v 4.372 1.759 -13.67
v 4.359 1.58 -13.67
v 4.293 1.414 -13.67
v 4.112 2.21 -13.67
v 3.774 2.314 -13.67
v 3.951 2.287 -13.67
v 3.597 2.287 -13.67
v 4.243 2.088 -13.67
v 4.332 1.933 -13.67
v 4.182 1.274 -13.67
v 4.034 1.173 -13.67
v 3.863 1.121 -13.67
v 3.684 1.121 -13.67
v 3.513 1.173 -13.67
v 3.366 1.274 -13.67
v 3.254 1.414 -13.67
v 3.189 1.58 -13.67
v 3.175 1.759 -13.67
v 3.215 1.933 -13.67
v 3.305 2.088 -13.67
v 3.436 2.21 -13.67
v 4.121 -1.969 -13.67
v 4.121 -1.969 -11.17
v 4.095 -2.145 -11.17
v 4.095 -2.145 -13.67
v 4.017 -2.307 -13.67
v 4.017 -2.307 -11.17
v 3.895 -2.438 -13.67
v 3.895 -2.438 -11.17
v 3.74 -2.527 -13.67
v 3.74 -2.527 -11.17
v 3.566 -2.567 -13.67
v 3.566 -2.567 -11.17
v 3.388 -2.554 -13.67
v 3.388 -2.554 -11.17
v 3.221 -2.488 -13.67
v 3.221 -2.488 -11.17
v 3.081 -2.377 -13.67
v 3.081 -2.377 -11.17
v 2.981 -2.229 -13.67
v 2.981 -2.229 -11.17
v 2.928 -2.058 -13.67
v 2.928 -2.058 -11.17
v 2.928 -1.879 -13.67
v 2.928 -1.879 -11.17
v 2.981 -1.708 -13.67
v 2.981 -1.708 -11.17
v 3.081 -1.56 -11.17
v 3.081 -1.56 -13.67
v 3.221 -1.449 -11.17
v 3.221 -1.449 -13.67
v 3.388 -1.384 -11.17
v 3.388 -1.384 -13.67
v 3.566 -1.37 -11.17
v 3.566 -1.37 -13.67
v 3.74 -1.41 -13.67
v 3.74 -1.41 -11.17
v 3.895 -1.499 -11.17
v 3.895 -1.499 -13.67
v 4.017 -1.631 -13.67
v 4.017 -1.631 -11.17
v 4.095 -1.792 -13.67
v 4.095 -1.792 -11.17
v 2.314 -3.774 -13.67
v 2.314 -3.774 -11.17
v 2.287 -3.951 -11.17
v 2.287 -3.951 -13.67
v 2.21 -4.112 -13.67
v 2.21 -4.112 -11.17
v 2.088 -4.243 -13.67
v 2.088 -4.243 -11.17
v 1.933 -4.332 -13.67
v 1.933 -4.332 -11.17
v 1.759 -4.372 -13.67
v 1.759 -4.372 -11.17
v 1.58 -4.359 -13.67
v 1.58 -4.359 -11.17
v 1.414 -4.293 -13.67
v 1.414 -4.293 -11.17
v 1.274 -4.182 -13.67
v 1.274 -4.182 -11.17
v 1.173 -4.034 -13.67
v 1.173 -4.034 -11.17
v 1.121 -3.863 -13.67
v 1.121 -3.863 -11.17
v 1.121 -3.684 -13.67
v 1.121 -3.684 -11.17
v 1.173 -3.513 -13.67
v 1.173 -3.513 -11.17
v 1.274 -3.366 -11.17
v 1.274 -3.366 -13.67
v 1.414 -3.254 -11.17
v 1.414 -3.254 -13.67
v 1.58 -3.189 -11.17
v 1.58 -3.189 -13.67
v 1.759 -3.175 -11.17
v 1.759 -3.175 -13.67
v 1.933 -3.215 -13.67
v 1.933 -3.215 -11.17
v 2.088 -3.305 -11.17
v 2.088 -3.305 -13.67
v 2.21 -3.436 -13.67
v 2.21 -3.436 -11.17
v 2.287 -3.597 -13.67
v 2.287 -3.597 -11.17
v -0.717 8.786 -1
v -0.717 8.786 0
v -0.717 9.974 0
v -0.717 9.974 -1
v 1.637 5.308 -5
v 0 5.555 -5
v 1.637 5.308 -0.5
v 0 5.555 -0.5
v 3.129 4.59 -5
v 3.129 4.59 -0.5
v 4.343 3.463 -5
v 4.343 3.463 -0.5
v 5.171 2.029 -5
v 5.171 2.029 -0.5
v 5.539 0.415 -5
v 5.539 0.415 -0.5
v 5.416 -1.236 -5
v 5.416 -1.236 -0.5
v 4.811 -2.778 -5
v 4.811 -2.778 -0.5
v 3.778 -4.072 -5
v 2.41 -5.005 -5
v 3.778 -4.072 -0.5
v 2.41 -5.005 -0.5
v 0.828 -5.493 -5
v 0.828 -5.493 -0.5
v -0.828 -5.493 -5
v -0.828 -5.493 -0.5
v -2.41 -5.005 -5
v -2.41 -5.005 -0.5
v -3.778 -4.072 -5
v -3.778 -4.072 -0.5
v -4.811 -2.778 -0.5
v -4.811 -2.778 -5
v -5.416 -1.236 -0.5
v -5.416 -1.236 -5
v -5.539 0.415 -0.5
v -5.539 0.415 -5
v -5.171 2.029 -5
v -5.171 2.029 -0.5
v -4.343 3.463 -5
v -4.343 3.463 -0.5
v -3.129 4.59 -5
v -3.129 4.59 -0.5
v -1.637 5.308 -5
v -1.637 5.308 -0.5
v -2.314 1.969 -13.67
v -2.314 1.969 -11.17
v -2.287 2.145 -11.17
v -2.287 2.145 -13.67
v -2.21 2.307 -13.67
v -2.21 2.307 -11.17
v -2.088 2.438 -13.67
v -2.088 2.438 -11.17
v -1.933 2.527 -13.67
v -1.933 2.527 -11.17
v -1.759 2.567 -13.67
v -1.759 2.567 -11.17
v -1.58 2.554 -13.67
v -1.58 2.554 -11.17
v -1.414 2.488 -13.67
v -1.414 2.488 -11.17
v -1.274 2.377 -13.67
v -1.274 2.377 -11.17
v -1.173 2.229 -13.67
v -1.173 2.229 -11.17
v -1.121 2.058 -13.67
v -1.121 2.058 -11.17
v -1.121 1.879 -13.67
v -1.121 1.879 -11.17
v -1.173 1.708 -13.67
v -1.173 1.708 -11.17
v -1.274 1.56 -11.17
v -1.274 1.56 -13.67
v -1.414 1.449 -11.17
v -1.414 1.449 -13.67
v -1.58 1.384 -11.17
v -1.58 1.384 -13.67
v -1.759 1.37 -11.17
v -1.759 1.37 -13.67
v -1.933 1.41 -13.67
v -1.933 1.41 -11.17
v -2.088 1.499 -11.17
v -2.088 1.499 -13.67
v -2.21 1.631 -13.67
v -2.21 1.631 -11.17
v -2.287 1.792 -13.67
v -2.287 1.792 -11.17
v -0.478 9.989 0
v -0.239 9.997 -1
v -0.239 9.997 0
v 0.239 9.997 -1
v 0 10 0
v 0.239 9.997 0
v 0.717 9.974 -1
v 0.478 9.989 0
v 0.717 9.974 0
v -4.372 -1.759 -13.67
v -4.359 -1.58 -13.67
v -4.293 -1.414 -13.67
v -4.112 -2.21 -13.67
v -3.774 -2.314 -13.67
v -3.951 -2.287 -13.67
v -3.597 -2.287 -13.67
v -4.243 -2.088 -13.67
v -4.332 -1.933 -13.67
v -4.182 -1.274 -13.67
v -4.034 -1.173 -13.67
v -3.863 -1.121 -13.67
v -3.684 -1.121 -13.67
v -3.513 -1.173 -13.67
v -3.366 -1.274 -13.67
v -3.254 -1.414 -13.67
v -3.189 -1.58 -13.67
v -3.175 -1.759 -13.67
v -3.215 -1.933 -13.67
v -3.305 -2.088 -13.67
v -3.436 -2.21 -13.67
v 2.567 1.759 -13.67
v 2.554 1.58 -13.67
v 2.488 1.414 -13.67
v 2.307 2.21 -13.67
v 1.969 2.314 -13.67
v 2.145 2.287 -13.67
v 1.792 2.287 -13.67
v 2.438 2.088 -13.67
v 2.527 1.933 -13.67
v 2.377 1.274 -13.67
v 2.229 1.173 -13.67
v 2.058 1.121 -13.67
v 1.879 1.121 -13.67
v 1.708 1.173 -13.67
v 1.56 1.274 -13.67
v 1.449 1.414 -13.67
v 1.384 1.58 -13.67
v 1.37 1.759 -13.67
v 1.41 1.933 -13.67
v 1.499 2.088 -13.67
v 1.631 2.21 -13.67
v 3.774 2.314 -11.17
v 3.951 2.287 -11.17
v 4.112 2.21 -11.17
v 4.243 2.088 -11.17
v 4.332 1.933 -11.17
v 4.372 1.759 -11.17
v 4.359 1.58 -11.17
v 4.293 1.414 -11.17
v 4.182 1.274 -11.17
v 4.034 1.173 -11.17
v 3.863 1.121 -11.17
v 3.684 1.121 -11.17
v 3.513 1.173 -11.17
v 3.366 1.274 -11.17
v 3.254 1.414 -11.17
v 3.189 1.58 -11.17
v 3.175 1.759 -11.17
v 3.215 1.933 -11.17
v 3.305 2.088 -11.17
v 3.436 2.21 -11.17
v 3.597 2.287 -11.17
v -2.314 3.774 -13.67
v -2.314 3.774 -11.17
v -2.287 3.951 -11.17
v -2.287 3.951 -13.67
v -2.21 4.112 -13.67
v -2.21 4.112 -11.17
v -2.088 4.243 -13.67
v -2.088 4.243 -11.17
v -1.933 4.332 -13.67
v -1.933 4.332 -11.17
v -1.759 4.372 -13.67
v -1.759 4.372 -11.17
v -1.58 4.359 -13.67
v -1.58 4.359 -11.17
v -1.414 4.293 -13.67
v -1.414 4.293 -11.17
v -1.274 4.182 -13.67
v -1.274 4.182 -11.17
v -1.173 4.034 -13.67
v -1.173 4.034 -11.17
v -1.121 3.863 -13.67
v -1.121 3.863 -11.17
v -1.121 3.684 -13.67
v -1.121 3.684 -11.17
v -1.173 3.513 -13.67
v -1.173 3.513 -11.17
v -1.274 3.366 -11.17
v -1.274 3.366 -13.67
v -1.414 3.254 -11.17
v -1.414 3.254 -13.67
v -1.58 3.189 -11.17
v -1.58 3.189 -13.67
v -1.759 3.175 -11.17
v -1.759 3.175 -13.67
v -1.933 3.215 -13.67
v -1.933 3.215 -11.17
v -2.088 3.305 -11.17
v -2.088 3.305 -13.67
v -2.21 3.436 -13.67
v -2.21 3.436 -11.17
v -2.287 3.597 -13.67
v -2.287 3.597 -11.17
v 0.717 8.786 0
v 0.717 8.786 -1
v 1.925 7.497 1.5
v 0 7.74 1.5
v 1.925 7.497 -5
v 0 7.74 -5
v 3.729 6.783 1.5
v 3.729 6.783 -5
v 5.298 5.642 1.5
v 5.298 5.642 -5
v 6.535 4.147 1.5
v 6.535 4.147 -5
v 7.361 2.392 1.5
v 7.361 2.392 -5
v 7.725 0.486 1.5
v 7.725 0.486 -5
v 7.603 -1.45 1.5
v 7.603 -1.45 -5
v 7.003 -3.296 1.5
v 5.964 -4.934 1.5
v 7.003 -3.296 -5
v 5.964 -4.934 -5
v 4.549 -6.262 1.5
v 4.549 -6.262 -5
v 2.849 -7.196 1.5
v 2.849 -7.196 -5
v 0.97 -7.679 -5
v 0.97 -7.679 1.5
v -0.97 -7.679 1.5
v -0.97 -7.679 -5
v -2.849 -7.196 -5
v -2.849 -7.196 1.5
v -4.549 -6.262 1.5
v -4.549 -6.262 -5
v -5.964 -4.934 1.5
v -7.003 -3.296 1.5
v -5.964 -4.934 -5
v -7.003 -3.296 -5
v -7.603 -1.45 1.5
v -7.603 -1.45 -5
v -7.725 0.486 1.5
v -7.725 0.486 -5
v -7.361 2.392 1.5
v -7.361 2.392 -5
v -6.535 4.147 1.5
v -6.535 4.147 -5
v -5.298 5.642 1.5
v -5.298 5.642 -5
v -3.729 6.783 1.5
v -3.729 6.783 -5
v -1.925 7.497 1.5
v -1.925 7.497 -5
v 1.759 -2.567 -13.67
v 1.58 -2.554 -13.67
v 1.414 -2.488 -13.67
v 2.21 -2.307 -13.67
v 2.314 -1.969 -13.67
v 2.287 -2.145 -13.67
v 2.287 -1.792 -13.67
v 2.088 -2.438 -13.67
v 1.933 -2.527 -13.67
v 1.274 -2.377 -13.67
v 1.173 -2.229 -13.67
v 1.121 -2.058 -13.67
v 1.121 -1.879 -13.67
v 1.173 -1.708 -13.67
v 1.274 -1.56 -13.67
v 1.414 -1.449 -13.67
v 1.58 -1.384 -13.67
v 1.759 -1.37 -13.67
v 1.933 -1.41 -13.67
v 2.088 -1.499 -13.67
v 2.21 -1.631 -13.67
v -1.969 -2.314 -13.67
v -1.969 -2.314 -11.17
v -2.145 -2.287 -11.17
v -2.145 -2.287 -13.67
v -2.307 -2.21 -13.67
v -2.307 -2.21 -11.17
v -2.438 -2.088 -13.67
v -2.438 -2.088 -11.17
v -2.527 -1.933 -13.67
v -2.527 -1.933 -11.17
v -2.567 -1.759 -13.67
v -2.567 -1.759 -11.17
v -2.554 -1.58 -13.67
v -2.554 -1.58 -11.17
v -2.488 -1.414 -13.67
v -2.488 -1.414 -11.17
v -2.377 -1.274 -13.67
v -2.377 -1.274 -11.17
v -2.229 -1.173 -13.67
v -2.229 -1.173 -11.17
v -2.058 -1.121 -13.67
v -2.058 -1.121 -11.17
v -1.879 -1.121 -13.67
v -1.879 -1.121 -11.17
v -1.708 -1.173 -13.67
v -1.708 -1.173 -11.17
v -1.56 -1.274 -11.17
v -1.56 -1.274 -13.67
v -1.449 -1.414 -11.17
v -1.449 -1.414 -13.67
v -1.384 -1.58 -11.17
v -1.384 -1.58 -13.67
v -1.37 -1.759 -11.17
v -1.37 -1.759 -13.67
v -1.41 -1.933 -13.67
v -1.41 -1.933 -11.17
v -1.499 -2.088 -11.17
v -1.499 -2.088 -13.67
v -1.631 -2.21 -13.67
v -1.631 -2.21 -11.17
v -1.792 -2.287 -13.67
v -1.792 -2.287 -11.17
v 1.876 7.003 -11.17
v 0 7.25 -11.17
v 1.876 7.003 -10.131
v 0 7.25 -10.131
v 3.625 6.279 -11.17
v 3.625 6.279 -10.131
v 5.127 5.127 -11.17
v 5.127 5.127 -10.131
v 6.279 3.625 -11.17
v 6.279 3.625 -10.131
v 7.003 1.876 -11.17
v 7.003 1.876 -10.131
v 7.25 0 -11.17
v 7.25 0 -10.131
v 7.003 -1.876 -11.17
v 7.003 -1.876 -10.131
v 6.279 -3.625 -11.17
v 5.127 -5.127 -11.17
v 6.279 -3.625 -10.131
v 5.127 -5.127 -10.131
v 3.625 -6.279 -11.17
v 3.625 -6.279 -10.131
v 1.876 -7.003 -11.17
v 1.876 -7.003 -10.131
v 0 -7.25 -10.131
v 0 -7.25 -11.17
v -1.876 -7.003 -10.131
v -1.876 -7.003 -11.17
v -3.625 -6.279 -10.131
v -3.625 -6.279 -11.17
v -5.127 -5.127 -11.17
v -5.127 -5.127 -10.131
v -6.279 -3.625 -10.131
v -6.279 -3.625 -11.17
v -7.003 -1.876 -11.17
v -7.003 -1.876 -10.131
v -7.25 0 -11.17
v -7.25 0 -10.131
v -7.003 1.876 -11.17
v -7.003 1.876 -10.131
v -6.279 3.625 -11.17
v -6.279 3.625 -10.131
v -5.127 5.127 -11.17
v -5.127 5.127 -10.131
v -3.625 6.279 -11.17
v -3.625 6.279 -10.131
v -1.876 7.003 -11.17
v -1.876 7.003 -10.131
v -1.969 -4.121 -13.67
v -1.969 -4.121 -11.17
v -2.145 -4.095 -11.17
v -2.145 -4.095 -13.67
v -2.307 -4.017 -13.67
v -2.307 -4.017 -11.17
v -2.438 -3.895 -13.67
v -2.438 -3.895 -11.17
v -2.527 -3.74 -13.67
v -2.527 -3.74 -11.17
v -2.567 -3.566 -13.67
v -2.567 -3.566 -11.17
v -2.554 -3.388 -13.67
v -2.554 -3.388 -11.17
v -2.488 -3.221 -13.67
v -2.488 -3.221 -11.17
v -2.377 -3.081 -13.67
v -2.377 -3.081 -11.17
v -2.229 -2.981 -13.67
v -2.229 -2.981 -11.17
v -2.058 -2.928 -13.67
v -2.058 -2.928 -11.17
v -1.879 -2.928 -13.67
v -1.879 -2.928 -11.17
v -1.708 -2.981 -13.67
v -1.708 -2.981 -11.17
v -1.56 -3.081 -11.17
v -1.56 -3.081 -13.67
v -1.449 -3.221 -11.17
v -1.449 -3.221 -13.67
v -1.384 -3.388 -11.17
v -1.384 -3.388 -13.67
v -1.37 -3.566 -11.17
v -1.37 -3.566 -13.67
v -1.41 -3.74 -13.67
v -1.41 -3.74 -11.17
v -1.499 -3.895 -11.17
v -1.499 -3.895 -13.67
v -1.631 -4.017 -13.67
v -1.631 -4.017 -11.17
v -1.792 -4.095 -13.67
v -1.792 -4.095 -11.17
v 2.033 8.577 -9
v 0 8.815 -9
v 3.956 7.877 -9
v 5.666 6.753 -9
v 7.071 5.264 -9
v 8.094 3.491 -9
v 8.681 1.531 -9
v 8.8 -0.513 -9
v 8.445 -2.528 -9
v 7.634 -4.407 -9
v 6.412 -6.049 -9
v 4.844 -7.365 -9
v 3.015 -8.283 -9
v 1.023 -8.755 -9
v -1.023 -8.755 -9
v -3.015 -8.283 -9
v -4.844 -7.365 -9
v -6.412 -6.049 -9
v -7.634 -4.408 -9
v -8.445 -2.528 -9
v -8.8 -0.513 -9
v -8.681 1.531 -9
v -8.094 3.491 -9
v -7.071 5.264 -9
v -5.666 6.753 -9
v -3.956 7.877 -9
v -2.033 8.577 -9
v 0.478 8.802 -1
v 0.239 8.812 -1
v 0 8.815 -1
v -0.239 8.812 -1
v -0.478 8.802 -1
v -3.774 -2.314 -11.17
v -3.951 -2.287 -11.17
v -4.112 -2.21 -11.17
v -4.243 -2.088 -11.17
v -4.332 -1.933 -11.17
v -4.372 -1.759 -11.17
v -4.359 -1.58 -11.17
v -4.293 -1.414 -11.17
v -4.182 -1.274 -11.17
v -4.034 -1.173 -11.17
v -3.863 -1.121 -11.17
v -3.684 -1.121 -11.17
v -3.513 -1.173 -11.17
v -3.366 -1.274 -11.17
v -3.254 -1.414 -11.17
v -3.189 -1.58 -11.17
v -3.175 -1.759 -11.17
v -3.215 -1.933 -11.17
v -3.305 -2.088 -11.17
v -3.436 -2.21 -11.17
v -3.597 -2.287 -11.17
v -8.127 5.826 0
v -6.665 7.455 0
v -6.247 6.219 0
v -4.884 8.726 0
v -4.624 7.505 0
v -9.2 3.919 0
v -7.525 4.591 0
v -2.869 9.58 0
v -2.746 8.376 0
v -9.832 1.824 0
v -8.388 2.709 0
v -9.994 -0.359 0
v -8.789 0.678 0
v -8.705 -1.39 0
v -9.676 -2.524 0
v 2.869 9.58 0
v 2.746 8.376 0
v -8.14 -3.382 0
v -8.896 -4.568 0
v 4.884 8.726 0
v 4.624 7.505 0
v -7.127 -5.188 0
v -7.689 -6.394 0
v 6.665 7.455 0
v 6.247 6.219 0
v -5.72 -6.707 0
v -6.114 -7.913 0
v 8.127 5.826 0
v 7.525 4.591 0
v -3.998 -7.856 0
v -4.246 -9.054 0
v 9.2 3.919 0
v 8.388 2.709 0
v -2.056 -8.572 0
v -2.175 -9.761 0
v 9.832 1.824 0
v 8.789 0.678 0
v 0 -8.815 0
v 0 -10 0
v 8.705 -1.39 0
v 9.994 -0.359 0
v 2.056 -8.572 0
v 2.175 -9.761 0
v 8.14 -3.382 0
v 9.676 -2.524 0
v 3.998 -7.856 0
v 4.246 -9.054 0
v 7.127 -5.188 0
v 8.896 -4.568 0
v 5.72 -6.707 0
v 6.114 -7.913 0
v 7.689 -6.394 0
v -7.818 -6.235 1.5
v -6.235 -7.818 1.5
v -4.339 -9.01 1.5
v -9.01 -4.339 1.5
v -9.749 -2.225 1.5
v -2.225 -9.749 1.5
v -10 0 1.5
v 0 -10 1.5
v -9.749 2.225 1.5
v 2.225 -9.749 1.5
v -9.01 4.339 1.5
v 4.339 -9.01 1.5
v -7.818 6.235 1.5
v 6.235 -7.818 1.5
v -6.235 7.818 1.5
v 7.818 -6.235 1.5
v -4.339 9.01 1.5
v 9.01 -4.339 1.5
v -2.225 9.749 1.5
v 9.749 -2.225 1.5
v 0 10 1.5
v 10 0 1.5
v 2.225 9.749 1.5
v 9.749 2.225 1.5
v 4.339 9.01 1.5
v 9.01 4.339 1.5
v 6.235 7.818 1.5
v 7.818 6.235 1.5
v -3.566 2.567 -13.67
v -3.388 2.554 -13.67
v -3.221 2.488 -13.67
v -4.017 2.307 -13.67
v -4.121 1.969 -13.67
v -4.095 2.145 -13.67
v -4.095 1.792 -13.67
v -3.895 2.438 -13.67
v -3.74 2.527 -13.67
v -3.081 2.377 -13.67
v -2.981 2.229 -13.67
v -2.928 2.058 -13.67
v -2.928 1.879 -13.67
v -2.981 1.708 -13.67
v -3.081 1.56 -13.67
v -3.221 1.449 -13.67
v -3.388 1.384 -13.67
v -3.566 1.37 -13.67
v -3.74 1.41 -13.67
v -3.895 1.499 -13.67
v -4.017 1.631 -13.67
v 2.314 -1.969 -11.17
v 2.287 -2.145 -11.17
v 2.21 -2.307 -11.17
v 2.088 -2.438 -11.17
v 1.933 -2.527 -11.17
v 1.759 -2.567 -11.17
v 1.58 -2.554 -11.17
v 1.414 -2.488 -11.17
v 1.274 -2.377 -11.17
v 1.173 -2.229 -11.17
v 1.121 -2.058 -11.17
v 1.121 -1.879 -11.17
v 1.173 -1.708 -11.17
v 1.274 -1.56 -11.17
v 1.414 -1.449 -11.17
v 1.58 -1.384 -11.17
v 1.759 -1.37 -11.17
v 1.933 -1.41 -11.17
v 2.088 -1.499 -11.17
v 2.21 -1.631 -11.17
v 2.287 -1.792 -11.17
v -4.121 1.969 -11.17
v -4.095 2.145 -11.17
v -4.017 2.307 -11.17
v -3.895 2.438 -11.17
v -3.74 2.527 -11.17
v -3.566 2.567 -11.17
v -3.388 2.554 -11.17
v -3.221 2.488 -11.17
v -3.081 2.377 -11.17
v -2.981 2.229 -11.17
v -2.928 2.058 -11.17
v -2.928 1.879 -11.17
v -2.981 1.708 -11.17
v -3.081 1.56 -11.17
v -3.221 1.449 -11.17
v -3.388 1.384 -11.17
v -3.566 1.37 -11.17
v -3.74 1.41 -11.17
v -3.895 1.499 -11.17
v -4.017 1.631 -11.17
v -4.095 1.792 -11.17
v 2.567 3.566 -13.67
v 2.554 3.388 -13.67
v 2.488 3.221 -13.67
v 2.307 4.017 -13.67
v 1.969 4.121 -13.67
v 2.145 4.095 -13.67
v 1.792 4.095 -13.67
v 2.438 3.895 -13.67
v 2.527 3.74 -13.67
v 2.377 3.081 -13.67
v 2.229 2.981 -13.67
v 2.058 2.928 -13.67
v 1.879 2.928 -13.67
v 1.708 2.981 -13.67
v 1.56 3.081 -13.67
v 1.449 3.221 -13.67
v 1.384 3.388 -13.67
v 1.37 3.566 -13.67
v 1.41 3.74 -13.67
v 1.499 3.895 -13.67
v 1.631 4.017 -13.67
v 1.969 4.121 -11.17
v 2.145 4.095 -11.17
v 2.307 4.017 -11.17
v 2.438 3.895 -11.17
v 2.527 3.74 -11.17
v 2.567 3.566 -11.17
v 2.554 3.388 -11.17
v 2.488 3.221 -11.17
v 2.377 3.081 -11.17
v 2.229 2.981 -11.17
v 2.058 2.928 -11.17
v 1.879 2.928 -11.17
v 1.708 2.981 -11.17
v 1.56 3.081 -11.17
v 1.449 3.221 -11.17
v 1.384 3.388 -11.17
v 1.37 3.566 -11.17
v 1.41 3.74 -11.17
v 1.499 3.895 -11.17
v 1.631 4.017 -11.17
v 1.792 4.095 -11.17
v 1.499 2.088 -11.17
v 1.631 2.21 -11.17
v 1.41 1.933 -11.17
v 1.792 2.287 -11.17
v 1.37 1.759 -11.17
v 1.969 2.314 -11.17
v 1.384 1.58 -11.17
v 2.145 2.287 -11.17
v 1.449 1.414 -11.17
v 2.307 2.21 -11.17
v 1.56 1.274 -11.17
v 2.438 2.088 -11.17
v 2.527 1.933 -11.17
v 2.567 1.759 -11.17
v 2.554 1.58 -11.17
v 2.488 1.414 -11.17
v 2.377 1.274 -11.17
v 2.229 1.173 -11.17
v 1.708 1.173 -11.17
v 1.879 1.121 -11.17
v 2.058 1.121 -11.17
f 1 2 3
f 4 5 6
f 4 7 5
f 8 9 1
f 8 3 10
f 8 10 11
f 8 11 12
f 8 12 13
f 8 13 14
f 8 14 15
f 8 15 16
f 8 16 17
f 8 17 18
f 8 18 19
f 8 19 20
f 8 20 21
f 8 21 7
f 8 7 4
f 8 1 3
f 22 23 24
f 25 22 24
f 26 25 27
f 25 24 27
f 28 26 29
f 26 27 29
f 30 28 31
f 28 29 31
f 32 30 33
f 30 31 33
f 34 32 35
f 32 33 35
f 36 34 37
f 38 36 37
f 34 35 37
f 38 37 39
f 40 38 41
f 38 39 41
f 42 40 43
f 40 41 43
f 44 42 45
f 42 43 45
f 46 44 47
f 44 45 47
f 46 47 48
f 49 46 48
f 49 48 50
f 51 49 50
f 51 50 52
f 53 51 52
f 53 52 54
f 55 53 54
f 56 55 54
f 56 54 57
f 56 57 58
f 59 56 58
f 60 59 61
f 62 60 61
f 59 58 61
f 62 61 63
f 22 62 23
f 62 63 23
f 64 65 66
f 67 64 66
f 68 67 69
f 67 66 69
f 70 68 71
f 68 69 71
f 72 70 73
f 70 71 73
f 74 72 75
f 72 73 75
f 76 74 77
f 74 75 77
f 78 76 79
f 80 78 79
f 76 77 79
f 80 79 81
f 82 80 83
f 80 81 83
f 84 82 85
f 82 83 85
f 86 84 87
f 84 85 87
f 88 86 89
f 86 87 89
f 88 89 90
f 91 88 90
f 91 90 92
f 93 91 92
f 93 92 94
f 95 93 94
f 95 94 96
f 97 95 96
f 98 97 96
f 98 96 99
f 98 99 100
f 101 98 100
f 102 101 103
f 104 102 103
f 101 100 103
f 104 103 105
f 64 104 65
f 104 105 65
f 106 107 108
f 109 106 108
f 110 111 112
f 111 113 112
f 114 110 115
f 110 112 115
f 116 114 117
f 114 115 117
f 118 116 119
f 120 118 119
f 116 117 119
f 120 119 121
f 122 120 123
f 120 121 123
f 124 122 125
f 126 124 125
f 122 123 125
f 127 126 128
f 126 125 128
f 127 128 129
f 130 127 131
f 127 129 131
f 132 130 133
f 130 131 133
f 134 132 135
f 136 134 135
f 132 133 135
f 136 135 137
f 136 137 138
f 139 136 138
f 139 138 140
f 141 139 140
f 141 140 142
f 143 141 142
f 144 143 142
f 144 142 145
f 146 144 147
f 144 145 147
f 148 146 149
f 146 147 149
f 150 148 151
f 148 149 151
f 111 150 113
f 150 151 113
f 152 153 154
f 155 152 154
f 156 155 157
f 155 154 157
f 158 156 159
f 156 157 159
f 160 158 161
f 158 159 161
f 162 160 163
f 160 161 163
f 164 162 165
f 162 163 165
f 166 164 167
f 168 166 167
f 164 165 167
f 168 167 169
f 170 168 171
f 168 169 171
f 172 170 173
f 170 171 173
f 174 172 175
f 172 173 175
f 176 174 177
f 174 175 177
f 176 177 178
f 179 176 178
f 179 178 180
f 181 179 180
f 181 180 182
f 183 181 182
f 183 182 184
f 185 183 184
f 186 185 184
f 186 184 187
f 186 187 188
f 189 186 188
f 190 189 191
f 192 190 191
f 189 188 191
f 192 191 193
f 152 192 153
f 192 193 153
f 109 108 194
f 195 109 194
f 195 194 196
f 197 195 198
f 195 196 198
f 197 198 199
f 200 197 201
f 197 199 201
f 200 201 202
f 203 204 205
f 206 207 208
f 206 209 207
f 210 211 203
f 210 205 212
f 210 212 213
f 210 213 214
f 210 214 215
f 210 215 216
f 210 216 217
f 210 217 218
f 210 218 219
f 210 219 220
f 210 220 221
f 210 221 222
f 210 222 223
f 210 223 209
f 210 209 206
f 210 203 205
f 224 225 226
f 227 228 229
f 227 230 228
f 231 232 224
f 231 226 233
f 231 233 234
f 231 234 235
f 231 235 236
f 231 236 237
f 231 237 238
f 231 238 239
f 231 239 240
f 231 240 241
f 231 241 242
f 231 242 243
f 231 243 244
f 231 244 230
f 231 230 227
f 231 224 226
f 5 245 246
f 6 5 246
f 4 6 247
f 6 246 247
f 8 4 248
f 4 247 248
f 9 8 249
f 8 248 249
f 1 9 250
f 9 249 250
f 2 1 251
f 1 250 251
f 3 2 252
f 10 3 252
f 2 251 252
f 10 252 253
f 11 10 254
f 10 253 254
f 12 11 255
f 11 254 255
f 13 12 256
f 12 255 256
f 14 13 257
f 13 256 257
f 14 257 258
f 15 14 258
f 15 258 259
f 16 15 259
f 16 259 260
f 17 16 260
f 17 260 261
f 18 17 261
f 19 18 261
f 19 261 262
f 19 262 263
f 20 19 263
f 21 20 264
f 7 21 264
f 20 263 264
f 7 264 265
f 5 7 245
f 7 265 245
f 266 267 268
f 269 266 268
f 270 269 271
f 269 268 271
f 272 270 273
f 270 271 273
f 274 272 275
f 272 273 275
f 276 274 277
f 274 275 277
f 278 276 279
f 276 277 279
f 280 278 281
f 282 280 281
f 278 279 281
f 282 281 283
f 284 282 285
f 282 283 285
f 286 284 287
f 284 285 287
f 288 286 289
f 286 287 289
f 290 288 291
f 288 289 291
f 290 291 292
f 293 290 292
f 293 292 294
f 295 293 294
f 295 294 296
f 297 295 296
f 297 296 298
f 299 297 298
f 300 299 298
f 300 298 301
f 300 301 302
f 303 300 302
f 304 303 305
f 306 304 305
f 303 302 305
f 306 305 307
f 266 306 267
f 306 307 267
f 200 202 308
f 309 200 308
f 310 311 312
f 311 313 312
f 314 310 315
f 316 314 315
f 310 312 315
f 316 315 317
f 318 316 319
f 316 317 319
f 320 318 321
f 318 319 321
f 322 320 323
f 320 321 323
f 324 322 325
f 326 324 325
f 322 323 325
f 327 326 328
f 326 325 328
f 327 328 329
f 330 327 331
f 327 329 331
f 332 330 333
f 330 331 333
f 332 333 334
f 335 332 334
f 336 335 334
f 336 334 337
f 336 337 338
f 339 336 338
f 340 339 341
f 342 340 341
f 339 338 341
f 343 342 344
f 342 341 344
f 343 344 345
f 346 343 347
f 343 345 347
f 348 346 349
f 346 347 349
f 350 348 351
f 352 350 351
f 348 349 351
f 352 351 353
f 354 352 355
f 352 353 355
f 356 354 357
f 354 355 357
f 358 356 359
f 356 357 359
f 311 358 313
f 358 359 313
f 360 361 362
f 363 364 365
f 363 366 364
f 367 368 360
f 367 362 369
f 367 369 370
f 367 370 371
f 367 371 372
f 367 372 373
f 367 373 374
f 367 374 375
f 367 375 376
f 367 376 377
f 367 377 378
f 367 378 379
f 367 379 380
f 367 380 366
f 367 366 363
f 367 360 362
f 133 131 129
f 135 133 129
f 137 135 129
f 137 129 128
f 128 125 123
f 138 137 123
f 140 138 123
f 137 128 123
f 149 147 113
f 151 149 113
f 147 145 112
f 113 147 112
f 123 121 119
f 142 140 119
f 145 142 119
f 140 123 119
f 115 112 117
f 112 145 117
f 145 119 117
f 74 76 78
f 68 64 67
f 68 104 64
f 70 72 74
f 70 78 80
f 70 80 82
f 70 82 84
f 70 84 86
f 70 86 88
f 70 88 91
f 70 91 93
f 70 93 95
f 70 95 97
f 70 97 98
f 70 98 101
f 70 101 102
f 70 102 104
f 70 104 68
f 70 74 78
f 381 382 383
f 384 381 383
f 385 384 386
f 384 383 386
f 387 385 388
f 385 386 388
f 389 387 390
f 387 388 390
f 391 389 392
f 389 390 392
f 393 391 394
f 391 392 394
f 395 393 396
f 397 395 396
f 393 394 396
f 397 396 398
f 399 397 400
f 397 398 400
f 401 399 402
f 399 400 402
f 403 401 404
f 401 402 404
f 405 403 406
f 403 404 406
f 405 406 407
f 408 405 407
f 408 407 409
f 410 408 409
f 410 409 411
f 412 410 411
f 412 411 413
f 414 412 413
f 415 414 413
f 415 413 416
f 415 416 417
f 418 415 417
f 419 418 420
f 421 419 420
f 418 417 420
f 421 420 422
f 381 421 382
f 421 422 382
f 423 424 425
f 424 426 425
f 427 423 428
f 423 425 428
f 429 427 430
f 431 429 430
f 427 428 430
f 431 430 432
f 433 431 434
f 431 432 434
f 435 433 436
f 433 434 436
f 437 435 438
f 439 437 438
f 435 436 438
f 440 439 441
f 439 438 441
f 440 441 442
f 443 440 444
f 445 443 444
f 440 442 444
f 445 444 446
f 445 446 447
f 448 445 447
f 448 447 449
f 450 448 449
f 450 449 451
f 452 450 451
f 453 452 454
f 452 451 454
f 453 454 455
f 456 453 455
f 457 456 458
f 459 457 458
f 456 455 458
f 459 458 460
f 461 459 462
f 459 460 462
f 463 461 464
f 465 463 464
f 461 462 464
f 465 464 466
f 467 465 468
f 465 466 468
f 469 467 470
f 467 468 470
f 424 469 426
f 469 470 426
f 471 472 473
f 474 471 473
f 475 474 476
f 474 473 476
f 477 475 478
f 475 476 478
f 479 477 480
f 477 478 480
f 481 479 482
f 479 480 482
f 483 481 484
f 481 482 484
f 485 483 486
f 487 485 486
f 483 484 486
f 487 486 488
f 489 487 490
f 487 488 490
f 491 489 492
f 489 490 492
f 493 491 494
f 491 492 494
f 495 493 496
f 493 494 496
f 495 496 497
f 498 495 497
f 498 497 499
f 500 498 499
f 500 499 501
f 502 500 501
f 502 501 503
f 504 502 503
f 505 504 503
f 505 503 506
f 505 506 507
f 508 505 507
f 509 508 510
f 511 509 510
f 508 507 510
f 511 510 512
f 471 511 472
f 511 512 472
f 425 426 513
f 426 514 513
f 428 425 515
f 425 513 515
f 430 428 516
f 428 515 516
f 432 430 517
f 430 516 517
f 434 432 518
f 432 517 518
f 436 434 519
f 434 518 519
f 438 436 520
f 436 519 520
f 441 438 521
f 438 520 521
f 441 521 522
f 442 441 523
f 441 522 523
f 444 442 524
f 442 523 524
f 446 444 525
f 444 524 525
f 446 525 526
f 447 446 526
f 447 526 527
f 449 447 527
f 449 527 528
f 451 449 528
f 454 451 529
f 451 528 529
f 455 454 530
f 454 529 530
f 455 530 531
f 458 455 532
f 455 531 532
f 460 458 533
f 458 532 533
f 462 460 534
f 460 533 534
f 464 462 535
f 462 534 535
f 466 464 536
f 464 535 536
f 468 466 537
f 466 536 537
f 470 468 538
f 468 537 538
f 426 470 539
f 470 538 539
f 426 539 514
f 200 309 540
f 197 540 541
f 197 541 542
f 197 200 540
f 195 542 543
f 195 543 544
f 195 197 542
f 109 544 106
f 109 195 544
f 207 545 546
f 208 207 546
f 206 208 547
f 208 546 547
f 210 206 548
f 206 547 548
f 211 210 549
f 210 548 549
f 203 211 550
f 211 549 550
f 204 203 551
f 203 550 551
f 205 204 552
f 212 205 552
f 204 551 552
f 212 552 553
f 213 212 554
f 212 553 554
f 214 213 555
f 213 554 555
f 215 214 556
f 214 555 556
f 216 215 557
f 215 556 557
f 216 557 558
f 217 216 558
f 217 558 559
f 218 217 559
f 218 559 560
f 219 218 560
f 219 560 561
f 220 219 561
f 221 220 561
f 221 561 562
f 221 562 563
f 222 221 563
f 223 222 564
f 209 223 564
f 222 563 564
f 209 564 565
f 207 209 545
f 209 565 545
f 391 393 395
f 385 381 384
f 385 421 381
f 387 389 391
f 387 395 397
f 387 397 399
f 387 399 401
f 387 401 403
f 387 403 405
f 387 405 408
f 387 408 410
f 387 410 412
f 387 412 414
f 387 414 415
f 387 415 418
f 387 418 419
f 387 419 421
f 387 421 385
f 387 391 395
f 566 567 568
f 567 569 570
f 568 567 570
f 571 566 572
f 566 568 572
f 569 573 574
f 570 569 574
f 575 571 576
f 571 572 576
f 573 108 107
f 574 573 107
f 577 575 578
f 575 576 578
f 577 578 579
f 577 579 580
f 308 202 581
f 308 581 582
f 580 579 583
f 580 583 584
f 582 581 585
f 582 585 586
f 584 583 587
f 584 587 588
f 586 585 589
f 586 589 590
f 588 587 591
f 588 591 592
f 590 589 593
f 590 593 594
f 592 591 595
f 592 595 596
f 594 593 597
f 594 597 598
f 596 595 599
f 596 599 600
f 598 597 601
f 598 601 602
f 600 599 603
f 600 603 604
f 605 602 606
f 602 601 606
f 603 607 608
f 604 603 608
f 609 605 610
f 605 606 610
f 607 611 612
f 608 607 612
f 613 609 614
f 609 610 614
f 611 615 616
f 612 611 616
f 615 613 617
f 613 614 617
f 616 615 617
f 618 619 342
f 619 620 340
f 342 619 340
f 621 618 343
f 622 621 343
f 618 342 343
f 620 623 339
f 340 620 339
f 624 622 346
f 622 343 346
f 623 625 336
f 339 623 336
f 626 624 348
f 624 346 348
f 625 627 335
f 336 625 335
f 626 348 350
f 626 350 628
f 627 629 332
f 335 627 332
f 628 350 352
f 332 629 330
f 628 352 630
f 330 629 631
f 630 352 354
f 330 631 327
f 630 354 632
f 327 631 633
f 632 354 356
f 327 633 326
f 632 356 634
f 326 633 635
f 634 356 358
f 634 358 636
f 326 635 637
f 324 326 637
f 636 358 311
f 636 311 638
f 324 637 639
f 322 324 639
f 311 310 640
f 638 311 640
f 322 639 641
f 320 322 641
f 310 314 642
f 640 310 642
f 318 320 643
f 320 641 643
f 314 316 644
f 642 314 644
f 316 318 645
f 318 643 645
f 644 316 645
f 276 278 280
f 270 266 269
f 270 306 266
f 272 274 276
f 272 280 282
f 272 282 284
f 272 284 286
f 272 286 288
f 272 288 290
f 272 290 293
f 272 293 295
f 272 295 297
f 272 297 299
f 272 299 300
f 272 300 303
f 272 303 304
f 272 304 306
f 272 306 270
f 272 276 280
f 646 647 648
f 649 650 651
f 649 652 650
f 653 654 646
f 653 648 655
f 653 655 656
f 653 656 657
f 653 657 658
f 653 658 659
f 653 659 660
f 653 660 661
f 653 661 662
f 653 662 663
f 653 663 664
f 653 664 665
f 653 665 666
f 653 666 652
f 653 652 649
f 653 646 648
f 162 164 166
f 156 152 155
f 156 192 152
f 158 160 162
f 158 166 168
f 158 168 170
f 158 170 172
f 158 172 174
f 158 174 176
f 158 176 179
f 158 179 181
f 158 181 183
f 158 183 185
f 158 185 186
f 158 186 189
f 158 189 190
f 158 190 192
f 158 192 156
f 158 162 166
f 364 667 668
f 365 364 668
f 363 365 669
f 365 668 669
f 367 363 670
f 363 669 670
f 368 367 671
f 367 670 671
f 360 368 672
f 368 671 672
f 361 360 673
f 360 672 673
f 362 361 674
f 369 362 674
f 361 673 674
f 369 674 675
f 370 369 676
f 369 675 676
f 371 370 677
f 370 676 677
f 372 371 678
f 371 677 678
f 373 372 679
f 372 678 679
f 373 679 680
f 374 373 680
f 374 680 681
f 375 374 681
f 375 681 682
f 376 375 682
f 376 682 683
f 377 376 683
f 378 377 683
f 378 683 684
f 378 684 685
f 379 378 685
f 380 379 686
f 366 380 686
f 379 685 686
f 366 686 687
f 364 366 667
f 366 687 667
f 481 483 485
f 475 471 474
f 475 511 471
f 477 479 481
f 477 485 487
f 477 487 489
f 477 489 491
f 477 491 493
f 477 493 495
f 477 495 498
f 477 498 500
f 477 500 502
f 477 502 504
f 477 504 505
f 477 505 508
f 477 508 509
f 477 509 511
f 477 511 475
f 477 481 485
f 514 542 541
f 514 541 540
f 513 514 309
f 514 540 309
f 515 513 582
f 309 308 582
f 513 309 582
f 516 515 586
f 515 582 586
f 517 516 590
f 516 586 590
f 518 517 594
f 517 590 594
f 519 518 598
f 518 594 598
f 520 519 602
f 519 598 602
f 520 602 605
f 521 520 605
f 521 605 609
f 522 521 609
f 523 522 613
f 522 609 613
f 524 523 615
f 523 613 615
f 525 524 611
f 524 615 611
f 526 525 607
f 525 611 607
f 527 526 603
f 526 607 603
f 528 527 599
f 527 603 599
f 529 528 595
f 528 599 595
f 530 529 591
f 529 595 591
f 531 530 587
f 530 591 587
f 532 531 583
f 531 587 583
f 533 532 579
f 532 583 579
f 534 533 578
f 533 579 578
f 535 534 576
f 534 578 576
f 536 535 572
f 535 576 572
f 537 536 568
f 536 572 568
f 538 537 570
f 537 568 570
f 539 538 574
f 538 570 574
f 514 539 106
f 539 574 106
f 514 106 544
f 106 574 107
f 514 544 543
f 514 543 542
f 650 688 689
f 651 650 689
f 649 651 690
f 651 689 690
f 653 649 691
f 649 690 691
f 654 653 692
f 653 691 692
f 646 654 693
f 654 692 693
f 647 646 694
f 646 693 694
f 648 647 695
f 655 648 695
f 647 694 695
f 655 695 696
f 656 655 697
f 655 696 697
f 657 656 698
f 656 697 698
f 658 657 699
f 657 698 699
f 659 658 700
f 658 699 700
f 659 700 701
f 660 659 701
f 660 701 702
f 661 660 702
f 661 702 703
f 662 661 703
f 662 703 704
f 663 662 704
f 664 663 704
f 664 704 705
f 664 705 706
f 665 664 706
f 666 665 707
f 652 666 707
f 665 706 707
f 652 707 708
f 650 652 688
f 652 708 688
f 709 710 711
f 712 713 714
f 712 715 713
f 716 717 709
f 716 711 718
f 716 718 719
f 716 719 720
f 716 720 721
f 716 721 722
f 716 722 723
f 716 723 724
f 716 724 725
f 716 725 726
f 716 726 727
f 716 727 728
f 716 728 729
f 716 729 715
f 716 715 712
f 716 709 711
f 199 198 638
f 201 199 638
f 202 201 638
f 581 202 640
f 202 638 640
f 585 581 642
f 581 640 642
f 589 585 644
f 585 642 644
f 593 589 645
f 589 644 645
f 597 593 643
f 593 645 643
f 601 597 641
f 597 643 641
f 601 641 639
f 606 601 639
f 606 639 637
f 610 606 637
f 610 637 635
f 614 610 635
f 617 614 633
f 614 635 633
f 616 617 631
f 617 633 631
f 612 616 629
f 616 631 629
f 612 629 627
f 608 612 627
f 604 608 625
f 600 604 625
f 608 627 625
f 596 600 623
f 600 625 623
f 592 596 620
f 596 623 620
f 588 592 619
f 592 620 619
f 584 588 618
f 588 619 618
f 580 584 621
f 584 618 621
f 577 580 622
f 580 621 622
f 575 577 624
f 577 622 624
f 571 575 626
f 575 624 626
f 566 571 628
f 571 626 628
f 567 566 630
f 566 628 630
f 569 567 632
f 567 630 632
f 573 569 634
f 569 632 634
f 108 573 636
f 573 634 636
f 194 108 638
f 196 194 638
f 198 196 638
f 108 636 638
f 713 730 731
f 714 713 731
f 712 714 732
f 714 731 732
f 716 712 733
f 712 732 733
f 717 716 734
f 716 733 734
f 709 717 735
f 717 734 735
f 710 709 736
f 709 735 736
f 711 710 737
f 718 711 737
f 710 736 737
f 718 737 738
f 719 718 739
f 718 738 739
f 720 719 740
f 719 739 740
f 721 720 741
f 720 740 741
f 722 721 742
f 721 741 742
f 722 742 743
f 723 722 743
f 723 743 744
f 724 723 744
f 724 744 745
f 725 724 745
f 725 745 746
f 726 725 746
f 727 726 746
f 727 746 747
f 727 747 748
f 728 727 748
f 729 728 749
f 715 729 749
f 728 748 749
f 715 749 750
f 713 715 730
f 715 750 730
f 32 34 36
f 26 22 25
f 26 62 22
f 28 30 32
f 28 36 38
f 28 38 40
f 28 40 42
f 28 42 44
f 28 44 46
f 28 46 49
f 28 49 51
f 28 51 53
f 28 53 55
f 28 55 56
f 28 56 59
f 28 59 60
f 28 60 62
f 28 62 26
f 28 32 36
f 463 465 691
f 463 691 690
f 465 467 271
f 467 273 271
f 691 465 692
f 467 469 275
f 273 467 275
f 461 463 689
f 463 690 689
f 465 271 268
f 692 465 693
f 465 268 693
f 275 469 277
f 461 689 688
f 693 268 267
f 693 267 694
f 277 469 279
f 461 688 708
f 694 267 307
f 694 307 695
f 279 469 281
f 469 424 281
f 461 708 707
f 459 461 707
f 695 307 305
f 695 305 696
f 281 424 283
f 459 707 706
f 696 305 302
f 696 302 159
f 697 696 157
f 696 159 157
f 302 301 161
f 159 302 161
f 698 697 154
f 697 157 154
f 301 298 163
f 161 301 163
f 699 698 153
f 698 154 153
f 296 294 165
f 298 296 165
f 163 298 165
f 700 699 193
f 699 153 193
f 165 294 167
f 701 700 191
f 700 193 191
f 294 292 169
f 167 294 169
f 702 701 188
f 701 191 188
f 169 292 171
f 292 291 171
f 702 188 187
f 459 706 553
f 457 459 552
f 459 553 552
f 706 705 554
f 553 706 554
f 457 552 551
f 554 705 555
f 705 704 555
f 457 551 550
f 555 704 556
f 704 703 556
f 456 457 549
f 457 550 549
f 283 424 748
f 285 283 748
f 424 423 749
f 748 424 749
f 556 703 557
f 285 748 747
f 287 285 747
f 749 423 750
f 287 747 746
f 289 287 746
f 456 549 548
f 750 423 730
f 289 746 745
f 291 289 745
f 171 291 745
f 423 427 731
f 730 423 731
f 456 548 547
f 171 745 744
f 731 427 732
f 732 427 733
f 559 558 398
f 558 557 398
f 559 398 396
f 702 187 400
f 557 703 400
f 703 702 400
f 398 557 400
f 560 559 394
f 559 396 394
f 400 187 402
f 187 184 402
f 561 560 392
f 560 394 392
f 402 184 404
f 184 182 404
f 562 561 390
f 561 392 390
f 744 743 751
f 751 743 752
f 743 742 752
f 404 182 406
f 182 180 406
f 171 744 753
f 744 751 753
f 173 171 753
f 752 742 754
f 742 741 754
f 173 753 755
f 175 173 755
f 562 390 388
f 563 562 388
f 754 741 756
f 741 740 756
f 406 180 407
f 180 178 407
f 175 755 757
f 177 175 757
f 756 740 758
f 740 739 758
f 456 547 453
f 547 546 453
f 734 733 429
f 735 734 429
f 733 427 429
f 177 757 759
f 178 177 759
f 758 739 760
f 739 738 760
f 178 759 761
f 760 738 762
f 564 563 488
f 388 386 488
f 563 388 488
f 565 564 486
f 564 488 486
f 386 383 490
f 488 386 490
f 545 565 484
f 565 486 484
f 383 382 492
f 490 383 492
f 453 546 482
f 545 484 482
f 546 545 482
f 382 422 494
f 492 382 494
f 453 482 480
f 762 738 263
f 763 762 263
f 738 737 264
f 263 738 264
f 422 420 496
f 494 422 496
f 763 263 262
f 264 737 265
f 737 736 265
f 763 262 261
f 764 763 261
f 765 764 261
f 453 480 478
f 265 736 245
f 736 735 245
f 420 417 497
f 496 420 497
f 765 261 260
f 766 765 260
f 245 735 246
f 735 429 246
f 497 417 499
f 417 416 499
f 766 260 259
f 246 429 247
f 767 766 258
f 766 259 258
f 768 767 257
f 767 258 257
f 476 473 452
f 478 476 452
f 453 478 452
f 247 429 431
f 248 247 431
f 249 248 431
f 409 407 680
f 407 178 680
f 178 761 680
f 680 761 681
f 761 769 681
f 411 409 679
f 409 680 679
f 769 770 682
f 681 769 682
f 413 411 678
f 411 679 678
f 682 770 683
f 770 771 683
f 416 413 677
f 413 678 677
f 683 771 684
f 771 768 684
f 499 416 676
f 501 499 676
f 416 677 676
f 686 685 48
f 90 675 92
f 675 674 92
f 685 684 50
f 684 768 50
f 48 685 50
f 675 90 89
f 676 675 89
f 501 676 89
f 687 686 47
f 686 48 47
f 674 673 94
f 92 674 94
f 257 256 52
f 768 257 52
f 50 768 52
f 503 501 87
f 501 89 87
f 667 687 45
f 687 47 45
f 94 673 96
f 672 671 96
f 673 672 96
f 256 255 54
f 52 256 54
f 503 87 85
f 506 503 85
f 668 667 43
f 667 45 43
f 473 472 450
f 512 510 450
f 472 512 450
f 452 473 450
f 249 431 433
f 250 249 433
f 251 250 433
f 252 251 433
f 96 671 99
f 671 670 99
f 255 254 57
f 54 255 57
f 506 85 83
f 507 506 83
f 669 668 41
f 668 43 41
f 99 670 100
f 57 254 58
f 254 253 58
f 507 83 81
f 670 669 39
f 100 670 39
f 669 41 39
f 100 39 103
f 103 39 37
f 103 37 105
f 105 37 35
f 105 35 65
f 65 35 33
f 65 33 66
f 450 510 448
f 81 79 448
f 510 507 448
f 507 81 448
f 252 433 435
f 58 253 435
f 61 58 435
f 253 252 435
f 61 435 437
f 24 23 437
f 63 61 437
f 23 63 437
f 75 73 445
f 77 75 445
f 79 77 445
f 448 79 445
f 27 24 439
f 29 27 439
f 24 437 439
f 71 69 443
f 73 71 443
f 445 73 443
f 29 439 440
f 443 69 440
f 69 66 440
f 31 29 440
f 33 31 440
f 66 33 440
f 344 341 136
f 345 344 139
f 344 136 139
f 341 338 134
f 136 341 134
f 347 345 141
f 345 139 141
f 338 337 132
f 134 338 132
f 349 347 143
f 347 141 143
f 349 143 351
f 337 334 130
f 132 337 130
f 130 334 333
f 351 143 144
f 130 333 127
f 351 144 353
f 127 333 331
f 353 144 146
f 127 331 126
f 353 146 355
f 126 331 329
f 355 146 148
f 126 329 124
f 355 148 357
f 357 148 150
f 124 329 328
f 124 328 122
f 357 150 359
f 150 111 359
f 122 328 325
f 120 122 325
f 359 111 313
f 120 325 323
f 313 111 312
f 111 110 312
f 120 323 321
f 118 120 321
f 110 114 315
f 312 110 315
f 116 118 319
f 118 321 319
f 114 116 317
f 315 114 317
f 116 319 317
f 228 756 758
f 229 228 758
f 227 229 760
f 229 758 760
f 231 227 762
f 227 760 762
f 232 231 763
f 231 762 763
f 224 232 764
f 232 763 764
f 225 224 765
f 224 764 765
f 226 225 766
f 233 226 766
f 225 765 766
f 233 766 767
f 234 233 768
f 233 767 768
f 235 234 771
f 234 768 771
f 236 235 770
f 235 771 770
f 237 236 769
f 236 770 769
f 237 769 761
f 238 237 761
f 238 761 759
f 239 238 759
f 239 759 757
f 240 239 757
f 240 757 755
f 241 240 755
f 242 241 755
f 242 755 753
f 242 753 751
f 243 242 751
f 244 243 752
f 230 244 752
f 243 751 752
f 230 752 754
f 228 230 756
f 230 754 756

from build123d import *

# Parameters (mm, degrees)
SKETCH3_R           = 0.6
BOSS_EXTRUDE1_DEPTH = 2.5
CIRPATTERN1_COUNT   = 4
BOSS_EXTRUDE2_DEPTH = 1


with BuildPart() as part:
    # Sketch2 → Revolve1 (revolve)
    with BuildSketch(Plane(origin=(0, 0, 0), x_dir=(0, 0, -1), z_dir=(1, 0, 0))):
        Polygon((0, 8.815), (0, 10), (-1.5, 10), (-1.5, 7.74), (5, 7.74), (5, 5.555), (0.5, 5.555), (0.5, 0), (11.17, 0), (11.17, 7.25), (10.130849194, 7.25), (9, 8.815), align=None)
    revolve(axis=Axis((0, 0, 11.357142857), (0, 0, -1)))

    # Sketch3 → Boss-Extrude1 (add)
    with BuildSketch(Plane(origin=(0, 0, -11.17), x_dir=(-1, 0, 0), z_dir=(0, 0, -1))):
        with Locations((1.71395454, 3.773699623)):
            Circle(SKETCH3_R)
        with Locations((1.71395454, 1.968598852)):
            Circle(SKETCH3_R)
        with Locations((3.52115951, 1.968598852)):
            Circle(SKETCH3_R)
    boss_extrude1 = extrude(amount=BOSS_EXTRUDE1_DEPTH)

    # CirPattern1: Boss-Extrude1 ×4 about axis
    cirpattern1_axis = Axis((0, 0, 0), (0, 0, 1))
    for i in range(1, CIRPATTERN1_COUNT):
        add(boss_extrude1.rotate(cirpattern1_axis, i * 360 / CIRPATTERN1_COUNT))

    # Sketch5 → Boss-Extrude2 (add)
    with BuildSketch(Plane(origin=(0, 0, 0), x_dir=(-1, 0, 0), z_dir=(0, 0, -1))):
        with BuildLine():
            Line((-0.71671494, 9.974282916), (-0.71671494, 8.78581497))
            ThreePointArc((-0.71671494, 8.78581497), (0, 8.815), (0.71671494, 8.78581497))
            Line((0.71671494, 8.78581497), (0.71671494, 9.974282916))
            ThreePointArc((0.71671494, 9.974282916), (0, 10), (-0.71671494, 9.974282916))
        make_face()
    extrude(amount=BOSS_EXTRUDE2_DEPTH)


solid = part.part
